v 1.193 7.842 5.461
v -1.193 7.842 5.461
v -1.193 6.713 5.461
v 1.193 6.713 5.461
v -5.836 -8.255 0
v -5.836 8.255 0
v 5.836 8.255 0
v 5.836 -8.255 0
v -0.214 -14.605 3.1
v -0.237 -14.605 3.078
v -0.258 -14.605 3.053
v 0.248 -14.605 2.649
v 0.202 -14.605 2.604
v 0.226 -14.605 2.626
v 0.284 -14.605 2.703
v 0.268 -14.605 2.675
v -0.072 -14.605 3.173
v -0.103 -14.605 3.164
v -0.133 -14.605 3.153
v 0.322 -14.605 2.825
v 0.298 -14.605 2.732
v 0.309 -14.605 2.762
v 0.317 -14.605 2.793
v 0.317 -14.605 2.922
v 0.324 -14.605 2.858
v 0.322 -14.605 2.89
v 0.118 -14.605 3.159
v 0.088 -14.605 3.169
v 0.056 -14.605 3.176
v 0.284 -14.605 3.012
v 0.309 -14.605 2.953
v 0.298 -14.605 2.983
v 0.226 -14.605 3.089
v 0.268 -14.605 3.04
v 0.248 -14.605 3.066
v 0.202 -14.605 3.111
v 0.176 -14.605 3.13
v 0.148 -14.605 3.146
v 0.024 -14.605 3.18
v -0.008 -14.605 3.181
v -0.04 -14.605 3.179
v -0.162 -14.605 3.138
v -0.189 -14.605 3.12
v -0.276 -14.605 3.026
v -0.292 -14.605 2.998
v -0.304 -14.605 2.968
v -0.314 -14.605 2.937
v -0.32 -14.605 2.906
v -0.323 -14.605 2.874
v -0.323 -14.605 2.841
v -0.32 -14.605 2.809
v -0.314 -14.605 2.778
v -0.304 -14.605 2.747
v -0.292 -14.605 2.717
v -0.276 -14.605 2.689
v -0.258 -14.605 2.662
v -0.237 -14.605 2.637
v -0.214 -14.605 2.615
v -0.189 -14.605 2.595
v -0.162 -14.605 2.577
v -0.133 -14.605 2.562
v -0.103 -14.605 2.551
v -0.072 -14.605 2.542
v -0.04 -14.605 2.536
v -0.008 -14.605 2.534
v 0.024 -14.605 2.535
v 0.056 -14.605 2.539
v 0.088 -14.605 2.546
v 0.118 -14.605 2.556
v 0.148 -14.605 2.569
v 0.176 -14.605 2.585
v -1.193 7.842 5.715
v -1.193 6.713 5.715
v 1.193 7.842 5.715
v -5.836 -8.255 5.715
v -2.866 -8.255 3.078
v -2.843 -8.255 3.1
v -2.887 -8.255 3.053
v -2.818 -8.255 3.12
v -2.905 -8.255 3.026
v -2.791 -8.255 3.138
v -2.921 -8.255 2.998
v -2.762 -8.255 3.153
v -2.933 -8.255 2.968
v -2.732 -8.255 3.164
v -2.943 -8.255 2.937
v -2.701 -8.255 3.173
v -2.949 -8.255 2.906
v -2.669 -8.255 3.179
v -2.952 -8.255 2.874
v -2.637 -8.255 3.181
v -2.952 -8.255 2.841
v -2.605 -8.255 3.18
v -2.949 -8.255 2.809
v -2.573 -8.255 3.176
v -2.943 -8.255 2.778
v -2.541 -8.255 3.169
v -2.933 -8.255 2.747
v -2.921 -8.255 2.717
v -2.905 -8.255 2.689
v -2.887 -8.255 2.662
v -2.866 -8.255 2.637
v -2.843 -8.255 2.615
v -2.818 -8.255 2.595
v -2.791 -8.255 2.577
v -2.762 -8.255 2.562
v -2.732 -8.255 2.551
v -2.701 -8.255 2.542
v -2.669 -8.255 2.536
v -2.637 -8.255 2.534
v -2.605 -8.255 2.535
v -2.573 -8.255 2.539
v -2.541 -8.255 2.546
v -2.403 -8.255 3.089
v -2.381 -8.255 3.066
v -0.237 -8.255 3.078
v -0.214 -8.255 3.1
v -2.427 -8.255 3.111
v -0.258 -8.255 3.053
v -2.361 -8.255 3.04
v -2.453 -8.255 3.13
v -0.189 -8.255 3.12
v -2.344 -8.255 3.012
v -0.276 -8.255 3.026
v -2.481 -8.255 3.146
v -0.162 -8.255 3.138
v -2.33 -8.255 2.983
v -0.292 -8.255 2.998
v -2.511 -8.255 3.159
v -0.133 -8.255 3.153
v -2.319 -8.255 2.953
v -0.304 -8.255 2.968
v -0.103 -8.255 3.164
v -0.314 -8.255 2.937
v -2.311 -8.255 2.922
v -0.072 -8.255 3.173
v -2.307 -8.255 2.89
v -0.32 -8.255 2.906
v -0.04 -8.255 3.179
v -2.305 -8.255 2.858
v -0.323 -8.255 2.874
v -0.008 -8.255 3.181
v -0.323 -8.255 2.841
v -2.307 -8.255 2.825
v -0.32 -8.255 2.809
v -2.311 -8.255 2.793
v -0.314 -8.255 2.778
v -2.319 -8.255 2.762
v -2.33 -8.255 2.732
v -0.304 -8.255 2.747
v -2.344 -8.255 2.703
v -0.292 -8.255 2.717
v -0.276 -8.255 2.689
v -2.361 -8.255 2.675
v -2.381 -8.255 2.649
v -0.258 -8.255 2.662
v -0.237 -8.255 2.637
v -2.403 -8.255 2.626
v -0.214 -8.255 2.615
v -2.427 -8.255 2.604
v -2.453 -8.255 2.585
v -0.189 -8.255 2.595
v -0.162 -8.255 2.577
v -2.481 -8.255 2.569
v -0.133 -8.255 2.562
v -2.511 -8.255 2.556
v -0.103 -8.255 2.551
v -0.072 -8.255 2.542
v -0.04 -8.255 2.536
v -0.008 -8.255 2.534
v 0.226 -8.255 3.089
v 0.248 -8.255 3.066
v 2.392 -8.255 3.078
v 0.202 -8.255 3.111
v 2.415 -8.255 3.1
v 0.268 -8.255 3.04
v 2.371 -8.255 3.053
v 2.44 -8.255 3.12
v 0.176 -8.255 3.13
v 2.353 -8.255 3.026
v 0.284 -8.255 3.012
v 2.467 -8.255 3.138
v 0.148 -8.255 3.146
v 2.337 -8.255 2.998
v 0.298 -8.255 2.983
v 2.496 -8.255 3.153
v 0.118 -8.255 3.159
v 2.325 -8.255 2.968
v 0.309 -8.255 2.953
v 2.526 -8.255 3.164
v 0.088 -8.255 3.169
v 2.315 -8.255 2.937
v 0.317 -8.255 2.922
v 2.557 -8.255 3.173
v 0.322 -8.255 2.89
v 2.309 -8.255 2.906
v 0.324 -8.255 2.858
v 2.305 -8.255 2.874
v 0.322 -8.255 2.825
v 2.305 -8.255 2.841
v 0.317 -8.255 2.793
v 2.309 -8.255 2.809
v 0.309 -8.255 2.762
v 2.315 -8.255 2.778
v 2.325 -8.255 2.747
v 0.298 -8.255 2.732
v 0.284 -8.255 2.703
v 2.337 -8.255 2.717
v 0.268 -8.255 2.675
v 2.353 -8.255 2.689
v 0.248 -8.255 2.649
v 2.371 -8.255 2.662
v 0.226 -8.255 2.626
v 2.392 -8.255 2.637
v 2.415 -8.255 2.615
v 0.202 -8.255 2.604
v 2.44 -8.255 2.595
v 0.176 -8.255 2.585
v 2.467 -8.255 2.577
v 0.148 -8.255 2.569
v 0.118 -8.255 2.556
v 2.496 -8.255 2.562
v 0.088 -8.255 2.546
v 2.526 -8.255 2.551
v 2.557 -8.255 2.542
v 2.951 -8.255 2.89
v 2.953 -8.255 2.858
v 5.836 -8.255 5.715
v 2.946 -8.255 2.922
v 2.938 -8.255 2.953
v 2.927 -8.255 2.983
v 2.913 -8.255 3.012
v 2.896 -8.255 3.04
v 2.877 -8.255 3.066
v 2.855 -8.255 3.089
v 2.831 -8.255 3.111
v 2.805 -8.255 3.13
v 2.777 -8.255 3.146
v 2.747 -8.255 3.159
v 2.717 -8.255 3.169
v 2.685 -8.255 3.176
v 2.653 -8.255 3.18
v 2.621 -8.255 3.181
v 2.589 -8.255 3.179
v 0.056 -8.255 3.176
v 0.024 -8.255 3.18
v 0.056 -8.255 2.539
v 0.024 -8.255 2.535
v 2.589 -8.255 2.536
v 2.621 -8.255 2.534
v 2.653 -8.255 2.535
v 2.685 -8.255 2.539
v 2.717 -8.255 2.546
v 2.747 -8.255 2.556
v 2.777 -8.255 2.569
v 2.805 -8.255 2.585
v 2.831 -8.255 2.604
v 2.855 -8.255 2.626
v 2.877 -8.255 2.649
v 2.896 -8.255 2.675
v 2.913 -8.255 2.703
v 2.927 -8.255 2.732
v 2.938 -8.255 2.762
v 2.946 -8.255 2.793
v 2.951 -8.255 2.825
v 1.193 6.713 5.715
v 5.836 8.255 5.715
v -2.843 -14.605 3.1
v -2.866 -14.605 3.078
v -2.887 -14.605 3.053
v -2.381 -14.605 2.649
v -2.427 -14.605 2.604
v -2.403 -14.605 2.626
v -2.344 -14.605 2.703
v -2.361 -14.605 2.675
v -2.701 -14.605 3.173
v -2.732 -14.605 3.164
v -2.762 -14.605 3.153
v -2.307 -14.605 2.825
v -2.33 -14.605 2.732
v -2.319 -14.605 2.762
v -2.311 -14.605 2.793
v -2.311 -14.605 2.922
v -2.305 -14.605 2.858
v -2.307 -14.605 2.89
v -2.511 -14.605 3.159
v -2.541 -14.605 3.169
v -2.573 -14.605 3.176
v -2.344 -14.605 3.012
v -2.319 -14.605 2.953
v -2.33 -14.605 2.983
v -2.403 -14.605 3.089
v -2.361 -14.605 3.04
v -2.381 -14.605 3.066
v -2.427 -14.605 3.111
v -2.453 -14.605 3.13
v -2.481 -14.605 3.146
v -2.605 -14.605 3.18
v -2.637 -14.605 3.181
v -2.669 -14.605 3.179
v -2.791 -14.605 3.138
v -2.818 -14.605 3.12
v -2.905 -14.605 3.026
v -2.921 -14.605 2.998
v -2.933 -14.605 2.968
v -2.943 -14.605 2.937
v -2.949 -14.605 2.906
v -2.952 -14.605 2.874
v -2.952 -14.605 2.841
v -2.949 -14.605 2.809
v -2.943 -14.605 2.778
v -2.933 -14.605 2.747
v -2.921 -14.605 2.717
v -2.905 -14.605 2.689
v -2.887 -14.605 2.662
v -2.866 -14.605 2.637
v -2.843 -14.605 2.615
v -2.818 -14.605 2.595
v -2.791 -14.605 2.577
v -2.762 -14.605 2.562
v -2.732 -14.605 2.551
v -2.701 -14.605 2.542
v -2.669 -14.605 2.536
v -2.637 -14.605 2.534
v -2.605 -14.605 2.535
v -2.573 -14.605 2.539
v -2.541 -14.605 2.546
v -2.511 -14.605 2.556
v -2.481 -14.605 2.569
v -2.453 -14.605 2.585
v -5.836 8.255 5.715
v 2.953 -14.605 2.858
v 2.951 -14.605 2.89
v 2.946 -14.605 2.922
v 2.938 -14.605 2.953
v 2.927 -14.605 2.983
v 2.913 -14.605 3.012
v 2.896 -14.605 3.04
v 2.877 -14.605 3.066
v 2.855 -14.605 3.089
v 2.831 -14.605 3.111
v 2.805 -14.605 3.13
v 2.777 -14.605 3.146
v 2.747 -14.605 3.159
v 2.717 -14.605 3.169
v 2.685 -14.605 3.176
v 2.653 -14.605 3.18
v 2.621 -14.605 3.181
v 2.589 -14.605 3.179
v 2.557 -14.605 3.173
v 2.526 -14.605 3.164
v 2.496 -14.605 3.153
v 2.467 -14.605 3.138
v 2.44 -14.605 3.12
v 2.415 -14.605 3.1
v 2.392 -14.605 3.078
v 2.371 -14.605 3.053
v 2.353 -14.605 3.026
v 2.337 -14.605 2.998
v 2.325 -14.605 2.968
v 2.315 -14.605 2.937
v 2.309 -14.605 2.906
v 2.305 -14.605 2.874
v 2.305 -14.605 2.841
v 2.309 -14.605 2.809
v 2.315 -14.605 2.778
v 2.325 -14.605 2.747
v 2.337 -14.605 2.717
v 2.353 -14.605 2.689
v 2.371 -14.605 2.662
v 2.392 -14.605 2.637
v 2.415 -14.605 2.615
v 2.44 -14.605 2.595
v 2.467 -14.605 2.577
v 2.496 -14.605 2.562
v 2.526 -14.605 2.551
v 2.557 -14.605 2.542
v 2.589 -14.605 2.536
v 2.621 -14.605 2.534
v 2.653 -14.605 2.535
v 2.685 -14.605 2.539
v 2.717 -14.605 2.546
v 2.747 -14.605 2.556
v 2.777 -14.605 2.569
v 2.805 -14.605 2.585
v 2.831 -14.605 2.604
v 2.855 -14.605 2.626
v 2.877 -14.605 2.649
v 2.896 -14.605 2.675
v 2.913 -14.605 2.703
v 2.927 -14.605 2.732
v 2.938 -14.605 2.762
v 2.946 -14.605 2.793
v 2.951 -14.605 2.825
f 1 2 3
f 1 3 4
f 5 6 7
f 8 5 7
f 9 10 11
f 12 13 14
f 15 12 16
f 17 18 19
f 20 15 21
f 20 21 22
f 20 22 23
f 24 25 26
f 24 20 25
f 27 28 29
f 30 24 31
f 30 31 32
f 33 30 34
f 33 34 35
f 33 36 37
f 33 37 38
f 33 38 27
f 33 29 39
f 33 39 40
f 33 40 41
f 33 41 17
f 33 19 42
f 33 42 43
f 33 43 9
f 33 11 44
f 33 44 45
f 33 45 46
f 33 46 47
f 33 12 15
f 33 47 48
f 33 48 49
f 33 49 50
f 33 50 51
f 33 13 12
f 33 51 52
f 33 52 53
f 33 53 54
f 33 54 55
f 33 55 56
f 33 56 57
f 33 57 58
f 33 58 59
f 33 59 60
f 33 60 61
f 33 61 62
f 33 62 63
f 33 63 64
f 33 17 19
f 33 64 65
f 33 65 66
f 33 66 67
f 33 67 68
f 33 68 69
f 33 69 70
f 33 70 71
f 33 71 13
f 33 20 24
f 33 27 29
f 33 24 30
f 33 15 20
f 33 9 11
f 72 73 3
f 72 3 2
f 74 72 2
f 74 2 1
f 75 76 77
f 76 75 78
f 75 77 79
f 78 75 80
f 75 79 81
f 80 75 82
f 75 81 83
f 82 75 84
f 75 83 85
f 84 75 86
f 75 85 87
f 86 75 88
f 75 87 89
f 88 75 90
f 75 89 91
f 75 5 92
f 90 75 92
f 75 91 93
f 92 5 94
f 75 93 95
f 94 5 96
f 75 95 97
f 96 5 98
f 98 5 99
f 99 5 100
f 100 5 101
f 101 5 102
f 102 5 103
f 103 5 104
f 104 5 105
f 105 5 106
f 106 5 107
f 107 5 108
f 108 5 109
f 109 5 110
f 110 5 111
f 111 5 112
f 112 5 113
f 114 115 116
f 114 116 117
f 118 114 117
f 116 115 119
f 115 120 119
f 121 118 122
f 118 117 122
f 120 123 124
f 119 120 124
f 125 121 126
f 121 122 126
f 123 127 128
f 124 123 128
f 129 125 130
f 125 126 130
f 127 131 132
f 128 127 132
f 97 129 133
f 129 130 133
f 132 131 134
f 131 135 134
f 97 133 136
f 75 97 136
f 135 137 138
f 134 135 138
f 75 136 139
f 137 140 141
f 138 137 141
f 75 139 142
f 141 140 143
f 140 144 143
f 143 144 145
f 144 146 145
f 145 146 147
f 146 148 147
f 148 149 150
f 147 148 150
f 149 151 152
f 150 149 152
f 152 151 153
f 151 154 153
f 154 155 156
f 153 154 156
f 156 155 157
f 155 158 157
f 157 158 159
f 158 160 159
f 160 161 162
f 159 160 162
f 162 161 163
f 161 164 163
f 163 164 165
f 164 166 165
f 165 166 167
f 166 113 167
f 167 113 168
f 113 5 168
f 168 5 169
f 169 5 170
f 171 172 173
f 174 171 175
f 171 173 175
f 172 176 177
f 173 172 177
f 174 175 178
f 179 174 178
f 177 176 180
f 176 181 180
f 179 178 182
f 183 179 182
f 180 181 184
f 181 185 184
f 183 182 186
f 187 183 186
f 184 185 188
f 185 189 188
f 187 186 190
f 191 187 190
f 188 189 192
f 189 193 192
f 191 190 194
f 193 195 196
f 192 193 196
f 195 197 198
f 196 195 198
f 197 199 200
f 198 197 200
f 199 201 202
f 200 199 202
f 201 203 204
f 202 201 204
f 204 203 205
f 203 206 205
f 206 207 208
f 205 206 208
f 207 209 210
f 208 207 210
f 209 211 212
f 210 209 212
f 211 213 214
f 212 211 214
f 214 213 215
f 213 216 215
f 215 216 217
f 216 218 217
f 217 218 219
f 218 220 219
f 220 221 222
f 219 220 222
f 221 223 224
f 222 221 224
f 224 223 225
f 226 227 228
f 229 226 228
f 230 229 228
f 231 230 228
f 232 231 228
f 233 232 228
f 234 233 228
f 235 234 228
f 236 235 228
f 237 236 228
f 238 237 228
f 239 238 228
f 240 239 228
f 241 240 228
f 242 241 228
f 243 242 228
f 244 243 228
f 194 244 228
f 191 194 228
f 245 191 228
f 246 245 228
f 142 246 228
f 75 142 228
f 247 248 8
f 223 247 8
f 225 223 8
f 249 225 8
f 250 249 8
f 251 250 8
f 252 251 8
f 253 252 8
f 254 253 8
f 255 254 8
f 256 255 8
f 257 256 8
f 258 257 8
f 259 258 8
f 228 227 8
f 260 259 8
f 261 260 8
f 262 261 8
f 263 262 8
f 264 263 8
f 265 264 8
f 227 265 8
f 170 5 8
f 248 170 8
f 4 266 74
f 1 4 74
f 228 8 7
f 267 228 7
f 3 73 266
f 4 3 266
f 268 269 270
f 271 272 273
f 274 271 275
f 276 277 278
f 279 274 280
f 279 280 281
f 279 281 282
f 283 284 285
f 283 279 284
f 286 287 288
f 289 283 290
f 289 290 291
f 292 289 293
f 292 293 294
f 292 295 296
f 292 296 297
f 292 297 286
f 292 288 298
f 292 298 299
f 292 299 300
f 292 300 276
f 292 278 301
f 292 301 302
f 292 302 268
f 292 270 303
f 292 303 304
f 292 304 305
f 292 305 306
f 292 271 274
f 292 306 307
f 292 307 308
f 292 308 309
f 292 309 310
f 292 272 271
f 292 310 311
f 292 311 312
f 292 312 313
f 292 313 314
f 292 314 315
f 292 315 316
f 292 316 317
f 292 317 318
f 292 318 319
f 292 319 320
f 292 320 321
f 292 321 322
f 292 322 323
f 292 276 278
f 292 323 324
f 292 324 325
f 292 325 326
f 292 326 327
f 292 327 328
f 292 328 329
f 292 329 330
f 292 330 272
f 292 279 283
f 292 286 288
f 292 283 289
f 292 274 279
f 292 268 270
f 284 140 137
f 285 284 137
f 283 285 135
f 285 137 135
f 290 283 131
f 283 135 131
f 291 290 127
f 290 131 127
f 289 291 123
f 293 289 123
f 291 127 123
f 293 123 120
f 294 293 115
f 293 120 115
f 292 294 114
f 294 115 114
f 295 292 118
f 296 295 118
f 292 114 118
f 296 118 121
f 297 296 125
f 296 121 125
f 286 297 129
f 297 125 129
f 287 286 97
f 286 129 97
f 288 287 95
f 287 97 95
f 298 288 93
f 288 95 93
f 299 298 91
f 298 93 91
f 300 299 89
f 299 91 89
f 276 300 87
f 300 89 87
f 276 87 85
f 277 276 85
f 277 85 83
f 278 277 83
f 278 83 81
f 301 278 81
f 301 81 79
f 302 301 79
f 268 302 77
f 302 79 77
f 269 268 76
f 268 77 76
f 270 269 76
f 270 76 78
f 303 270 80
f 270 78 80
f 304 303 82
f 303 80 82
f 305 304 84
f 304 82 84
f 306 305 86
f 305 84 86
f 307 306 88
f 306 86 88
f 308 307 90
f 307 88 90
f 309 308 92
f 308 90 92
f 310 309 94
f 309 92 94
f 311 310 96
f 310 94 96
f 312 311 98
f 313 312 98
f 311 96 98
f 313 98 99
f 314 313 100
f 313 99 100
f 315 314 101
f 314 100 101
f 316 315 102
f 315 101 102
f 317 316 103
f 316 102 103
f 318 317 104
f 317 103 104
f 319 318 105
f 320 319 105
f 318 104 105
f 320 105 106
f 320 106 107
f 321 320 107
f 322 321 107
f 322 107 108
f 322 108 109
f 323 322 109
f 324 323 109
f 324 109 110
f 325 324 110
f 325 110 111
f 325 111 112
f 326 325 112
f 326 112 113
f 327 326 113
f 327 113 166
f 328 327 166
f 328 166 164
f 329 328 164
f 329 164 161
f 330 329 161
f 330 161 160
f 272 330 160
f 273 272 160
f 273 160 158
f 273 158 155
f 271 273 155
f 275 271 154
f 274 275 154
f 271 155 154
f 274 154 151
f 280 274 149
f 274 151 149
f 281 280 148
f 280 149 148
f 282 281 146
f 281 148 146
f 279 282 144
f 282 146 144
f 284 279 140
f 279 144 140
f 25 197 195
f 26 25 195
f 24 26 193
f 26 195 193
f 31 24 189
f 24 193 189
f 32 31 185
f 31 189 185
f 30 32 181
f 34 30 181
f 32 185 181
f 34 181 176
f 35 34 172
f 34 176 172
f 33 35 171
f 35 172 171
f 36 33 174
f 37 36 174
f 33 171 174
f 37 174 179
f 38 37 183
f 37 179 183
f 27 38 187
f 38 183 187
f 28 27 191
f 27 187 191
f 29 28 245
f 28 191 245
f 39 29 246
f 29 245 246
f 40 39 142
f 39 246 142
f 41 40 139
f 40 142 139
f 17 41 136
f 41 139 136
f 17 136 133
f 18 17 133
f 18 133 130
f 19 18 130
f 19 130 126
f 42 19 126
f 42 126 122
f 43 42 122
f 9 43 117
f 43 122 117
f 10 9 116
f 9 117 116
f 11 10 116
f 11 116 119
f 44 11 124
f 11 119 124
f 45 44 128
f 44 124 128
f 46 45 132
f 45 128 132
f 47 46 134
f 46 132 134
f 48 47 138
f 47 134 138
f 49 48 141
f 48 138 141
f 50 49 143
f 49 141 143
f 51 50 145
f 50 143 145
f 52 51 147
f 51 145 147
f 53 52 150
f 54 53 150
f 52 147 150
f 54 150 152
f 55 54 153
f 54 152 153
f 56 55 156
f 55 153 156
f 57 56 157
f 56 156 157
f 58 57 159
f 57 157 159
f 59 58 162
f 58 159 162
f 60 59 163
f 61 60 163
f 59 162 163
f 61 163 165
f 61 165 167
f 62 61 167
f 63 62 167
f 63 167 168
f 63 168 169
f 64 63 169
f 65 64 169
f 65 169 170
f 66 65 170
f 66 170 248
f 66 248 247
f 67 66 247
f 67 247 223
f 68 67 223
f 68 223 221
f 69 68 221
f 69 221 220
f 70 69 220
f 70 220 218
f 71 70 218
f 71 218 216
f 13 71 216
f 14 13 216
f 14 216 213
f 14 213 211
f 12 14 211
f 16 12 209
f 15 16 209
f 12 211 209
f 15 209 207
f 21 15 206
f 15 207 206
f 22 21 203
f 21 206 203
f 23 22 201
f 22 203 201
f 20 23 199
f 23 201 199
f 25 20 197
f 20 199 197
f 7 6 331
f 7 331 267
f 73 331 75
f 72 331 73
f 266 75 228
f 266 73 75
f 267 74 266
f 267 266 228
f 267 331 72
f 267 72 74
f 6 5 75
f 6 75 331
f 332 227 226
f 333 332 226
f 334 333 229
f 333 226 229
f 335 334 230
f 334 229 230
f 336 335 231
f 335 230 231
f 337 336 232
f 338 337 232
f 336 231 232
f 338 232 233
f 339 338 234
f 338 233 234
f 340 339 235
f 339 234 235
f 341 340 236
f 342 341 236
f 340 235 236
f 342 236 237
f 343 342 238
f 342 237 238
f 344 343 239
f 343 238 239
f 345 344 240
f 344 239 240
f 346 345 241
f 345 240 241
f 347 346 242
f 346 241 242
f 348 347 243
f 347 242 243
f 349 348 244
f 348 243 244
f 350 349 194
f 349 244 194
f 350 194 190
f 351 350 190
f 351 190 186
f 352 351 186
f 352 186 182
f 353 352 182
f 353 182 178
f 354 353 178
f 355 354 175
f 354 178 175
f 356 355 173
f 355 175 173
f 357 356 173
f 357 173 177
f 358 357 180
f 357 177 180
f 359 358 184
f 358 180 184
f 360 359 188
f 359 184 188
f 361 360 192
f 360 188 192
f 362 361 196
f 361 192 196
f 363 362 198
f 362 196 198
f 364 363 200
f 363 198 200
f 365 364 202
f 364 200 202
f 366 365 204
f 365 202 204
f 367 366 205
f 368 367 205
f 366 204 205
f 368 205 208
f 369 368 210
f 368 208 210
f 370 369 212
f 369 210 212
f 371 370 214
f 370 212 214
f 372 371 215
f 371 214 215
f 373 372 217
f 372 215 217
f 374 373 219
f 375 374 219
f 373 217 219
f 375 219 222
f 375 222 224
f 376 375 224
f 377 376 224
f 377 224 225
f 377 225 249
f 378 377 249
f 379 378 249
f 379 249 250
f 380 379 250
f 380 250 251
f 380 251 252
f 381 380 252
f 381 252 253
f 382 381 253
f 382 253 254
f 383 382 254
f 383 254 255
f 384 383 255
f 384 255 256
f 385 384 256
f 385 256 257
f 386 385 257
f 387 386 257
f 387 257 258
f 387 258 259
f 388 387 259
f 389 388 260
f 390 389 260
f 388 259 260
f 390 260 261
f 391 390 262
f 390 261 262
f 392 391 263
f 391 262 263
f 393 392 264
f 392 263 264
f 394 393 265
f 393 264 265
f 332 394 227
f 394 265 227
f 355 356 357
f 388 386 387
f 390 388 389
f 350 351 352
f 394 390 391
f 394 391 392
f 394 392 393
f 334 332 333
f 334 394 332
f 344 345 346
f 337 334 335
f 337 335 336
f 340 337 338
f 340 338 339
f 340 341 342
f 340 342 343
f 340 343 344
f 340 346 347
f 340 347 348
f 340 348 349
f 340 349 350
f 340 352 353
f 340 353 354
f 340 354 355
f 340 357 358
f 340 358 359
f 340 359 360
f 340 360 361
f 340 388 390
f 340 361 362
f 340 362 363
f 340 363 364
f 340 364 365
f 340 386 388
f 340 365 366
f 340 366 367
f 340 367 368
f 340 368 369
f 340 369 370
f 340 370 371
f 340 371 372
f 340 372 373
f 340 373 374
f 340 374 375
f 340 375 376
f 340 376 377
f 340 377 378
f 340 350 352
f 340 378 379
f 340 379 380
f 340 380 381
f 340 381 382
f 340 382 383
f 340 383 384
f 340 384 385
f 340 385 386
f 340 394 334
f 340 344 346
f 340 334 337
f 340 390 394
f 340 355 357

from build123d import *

# Parameters (mm, degrees)
SKETCH1_W           = 11.6713
SKETCH1_H           = 16.51
BOSS_EXTRUDE1_DEPTH = 5.715
SKETCH2_W           = 2.385044452
SKETCH2_H           = 1.128356889
CUT_EXTRUDE1_DEPTH  = 0.254
SKETCH3_R           = 0.32385
BOSS_EXTRUDE2_DEPTH = 6.35


with BuildPart() as part:
    # Sketch1 → Boss-Extrude1 (new body)
    with BuildSketch(Plane.XY):
        Rectangle(SKETCH1_W, SKETCH1_H)
    extrude(amount=BOSS_EXTRUDE1_DEPTH)

    # Sketch2 → Cut-Extrude1 (cut)
    with BuildSketch(Plane.XY.offset(5.715)):
        with Locations((0, 7.277518213)):
            Rectangle(SKETCH2_W, SKETCH2_H)
    extrude(amount=-CUT_EXTRUDE1_DEPTH, mode=Mode.SUBTRACT)

    # Sketch3 → Boss-Extrude2 (add)
    with BuildSketch(Plane.XZ.offset(8.255)):
        with Locations((-2.6289, 2.8575)):
            Circle(SKETCH3_R)
        with Locations((0, 2.8575)):
            Circle(SKETCH3_R)
        with Locations((2.6289, 2.8575)):
            Circle(SKETCH3_R)
    extrude(amount=BOSS_EXTRUDE2_DEPTH)


solid = part.part
